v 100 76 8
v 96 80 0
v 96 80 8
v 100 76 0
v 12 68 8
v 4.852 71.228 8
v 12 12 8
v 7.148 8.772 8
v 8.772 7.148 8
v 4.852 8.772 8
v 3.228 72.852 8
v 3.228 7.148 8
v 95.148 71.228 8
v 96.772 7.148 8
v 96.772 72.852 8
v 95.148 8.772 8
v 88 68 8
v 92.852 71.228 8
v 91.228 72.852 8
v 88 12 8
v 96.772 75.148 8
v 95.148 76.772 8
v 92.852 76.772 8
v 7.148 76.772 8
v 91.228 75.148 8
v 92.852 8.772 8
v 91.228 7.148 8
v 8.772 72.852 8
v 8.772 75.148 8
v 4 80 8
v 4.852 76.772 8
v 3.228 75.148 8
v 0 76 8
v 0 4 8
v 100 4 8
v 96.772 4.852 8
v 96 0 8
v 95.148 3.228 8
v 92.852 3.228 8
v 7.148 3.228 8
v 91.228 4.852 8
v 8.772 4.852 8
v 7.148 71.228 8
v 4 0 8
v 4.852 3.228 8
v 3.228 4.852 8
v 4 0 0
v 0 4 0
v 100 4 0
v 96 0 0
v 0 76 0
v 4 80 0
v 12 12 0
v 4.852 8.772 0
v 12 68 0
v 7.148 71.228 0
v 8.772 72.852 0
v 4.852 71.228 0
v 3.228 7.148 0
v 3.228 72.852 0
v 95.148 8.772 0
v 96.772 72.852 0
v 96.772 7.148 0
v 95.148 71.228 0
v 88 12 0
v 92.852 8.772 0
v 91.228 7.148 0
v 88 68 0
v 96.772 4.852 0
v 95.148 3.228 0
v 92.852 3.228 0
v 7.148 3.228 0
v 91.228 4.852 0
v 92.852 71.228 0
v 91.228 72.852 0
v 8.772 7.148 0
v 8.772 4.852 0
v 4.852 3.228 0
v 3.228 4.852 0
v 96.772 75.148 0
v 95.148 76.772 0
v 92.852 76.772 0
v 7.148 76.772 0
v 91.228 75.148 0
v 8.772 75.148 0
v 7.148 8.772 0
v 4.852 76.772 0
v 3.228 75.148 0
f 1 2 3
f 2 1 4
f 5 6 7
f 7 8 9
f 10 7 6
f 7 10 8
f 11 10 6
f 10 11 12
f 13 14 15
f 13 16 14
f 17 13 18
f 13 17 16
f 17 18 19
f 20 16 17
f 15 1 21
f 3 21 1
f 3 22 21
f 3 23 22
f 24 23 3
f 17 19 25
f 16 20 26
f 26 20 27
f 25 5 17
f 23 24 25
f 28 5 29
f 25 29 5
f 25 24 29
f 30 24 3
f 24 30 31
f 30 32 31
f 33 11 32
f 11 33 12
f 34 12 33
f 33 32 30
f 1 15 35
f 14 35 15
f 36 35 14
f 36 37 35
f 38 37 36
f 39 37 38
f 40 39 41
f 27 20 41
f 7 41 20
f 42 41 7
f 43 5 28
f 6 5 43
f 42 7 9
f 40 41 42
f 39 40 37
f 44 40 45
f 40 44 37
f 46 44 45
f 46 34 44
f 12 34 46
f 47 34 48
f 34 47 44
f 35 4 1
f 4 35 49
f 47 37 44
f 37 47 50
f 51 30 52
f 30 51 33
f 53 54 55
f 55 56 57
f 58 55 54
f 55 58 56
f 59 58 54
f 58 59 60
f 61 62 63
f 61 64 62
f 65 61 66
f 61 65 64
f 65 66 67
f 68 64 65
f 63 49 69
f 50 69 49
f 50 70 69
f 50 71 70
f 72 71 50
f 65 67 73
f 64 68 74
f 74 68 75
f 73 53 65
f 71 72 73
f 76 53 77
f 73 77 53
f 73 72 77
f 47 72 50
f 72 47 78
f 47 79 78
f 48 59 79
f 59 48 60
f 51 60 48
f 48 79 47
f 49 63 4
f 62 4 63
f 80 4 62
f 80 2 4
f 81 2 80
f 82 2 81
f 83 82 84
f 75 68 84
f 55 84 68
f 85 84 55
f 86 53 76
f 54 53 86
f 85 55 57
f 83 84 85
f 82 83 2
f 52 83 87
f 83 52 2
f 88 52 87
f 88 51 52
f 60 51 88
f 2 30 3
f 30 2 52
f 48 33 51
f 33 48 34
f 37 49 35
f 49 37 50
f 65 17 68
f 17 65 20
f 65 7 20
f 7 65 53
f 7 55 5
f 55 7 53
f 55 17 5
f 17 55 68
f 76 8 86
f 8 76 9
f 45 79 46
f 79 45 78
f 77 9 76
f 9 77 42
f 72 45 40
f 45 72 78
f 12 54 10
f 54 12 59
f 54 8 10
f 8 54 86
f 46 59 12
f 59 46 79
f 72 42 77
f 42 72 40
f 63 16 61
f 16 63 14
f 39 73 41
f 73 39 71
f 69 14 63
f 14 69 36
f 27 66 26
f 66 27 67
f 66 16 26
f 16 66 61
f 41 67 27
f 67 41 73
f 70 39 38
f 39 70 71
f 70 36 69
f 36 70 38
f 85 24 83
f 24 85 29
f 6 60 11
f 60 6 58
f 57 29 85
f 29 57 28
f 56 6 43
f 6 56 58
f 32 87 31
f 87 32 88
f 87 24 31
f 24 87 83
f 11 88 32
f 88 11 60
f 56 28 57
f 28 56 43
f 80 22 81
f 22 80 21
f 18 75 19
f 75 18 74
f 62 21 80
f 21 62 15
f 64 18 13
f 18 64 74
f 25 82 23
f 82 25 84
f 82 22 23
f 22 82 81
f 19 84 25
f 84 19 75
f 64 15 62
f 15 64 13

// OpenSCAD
$fn = 32;

// ----------------------------------------------------------------------
// Frame plate: 100 x 80 frame, 12 mm rails
// ----------------------------------------------------------------------

// --- parameters (mm) ---
plate_l = 100;            // plate length, X
plate_w = 80;             // plate width, Y
plate_t = 8;              // plate thickness, Z (extrusion height)
corner_c = 4;             // corner chamfer
frame_bar = 12;           // frame rail width
bolt_r = 3;               // corner bolt window radius
bolt_inset = 6;           // bolt centre inset from the edges

win_l = plate_l - 2 * frame_bar;  // window length
win_w = plate_w - 2 * frame_bar;  // window width
bolt_d = 2 * bolt_r;  // corner hole diameter

profile = [[4, 0], [96, 0], [100, 4], [100, 76], [96, 80], [4, 80], [0, 76], [0, 4]];  // primary outline, 8 points, counter clockwise
void_1 = [[12, 12], [88, 12], [88, 68], [12, 68]];  // the window, 4 points
void_2 = [[8.772, 7.148], [7.148, 8.772], [4.852, 8.772], [3.228, 7.148], [3.228, 4.852], [4.852, 3.228], [7.148, 3.228], [8.772, 4.852]];  // corner bolt window, 8 points
void_3 = [[96.772, 7.148], [95.148, 8.772], [92.852, 8.772], [91.228, 7.148], [91.228, 4.852], [92.852, 3.228], [95.148, 3.228], [96.772, 4.852]];  // corner bolt window, 8 points
void_4 = [[8.772, 75.148], [7.148, 76.772], [4.852, 76.772], [3.228, 75.148], [3.228, 72.852], [4.852, 71.228], [7.148, 71.228], [8.772, 72.852]];  // corner bolt window, 8 points
void_5 = [[96.772, 75.148], [95.148, 76.772], [92.852, 76.772], [91.228, 75.148], [91.228, 72.852], [92.852, 71.228], [95.148, 71.228], [96.772, 72.852]];  // corner bolt window, 8 points

// --- the one profile operation ---
difference() {
  linear_extrude(height = plate_t) polygon(points = profile);
  translate([0, 0, -1])
    linear_extrude(height = plate_t + 2) polygon(points = void_1);
  translate([0, 0, -1])
    linear_extrude(height = plate_t + 2) polygon(points = void_2);
  translate([0, 0, -1])
    linear_extrude(height = plate_t + 2) polygon(points = void_3);
  translate([0, 0, -1])
    linear_extrude(height = plate_t + 2) polygon(points = void_4);
  translate([0, 0, -1])
    linear_extrude(height = plate_t + 2) polygon(points = void_5);
}
